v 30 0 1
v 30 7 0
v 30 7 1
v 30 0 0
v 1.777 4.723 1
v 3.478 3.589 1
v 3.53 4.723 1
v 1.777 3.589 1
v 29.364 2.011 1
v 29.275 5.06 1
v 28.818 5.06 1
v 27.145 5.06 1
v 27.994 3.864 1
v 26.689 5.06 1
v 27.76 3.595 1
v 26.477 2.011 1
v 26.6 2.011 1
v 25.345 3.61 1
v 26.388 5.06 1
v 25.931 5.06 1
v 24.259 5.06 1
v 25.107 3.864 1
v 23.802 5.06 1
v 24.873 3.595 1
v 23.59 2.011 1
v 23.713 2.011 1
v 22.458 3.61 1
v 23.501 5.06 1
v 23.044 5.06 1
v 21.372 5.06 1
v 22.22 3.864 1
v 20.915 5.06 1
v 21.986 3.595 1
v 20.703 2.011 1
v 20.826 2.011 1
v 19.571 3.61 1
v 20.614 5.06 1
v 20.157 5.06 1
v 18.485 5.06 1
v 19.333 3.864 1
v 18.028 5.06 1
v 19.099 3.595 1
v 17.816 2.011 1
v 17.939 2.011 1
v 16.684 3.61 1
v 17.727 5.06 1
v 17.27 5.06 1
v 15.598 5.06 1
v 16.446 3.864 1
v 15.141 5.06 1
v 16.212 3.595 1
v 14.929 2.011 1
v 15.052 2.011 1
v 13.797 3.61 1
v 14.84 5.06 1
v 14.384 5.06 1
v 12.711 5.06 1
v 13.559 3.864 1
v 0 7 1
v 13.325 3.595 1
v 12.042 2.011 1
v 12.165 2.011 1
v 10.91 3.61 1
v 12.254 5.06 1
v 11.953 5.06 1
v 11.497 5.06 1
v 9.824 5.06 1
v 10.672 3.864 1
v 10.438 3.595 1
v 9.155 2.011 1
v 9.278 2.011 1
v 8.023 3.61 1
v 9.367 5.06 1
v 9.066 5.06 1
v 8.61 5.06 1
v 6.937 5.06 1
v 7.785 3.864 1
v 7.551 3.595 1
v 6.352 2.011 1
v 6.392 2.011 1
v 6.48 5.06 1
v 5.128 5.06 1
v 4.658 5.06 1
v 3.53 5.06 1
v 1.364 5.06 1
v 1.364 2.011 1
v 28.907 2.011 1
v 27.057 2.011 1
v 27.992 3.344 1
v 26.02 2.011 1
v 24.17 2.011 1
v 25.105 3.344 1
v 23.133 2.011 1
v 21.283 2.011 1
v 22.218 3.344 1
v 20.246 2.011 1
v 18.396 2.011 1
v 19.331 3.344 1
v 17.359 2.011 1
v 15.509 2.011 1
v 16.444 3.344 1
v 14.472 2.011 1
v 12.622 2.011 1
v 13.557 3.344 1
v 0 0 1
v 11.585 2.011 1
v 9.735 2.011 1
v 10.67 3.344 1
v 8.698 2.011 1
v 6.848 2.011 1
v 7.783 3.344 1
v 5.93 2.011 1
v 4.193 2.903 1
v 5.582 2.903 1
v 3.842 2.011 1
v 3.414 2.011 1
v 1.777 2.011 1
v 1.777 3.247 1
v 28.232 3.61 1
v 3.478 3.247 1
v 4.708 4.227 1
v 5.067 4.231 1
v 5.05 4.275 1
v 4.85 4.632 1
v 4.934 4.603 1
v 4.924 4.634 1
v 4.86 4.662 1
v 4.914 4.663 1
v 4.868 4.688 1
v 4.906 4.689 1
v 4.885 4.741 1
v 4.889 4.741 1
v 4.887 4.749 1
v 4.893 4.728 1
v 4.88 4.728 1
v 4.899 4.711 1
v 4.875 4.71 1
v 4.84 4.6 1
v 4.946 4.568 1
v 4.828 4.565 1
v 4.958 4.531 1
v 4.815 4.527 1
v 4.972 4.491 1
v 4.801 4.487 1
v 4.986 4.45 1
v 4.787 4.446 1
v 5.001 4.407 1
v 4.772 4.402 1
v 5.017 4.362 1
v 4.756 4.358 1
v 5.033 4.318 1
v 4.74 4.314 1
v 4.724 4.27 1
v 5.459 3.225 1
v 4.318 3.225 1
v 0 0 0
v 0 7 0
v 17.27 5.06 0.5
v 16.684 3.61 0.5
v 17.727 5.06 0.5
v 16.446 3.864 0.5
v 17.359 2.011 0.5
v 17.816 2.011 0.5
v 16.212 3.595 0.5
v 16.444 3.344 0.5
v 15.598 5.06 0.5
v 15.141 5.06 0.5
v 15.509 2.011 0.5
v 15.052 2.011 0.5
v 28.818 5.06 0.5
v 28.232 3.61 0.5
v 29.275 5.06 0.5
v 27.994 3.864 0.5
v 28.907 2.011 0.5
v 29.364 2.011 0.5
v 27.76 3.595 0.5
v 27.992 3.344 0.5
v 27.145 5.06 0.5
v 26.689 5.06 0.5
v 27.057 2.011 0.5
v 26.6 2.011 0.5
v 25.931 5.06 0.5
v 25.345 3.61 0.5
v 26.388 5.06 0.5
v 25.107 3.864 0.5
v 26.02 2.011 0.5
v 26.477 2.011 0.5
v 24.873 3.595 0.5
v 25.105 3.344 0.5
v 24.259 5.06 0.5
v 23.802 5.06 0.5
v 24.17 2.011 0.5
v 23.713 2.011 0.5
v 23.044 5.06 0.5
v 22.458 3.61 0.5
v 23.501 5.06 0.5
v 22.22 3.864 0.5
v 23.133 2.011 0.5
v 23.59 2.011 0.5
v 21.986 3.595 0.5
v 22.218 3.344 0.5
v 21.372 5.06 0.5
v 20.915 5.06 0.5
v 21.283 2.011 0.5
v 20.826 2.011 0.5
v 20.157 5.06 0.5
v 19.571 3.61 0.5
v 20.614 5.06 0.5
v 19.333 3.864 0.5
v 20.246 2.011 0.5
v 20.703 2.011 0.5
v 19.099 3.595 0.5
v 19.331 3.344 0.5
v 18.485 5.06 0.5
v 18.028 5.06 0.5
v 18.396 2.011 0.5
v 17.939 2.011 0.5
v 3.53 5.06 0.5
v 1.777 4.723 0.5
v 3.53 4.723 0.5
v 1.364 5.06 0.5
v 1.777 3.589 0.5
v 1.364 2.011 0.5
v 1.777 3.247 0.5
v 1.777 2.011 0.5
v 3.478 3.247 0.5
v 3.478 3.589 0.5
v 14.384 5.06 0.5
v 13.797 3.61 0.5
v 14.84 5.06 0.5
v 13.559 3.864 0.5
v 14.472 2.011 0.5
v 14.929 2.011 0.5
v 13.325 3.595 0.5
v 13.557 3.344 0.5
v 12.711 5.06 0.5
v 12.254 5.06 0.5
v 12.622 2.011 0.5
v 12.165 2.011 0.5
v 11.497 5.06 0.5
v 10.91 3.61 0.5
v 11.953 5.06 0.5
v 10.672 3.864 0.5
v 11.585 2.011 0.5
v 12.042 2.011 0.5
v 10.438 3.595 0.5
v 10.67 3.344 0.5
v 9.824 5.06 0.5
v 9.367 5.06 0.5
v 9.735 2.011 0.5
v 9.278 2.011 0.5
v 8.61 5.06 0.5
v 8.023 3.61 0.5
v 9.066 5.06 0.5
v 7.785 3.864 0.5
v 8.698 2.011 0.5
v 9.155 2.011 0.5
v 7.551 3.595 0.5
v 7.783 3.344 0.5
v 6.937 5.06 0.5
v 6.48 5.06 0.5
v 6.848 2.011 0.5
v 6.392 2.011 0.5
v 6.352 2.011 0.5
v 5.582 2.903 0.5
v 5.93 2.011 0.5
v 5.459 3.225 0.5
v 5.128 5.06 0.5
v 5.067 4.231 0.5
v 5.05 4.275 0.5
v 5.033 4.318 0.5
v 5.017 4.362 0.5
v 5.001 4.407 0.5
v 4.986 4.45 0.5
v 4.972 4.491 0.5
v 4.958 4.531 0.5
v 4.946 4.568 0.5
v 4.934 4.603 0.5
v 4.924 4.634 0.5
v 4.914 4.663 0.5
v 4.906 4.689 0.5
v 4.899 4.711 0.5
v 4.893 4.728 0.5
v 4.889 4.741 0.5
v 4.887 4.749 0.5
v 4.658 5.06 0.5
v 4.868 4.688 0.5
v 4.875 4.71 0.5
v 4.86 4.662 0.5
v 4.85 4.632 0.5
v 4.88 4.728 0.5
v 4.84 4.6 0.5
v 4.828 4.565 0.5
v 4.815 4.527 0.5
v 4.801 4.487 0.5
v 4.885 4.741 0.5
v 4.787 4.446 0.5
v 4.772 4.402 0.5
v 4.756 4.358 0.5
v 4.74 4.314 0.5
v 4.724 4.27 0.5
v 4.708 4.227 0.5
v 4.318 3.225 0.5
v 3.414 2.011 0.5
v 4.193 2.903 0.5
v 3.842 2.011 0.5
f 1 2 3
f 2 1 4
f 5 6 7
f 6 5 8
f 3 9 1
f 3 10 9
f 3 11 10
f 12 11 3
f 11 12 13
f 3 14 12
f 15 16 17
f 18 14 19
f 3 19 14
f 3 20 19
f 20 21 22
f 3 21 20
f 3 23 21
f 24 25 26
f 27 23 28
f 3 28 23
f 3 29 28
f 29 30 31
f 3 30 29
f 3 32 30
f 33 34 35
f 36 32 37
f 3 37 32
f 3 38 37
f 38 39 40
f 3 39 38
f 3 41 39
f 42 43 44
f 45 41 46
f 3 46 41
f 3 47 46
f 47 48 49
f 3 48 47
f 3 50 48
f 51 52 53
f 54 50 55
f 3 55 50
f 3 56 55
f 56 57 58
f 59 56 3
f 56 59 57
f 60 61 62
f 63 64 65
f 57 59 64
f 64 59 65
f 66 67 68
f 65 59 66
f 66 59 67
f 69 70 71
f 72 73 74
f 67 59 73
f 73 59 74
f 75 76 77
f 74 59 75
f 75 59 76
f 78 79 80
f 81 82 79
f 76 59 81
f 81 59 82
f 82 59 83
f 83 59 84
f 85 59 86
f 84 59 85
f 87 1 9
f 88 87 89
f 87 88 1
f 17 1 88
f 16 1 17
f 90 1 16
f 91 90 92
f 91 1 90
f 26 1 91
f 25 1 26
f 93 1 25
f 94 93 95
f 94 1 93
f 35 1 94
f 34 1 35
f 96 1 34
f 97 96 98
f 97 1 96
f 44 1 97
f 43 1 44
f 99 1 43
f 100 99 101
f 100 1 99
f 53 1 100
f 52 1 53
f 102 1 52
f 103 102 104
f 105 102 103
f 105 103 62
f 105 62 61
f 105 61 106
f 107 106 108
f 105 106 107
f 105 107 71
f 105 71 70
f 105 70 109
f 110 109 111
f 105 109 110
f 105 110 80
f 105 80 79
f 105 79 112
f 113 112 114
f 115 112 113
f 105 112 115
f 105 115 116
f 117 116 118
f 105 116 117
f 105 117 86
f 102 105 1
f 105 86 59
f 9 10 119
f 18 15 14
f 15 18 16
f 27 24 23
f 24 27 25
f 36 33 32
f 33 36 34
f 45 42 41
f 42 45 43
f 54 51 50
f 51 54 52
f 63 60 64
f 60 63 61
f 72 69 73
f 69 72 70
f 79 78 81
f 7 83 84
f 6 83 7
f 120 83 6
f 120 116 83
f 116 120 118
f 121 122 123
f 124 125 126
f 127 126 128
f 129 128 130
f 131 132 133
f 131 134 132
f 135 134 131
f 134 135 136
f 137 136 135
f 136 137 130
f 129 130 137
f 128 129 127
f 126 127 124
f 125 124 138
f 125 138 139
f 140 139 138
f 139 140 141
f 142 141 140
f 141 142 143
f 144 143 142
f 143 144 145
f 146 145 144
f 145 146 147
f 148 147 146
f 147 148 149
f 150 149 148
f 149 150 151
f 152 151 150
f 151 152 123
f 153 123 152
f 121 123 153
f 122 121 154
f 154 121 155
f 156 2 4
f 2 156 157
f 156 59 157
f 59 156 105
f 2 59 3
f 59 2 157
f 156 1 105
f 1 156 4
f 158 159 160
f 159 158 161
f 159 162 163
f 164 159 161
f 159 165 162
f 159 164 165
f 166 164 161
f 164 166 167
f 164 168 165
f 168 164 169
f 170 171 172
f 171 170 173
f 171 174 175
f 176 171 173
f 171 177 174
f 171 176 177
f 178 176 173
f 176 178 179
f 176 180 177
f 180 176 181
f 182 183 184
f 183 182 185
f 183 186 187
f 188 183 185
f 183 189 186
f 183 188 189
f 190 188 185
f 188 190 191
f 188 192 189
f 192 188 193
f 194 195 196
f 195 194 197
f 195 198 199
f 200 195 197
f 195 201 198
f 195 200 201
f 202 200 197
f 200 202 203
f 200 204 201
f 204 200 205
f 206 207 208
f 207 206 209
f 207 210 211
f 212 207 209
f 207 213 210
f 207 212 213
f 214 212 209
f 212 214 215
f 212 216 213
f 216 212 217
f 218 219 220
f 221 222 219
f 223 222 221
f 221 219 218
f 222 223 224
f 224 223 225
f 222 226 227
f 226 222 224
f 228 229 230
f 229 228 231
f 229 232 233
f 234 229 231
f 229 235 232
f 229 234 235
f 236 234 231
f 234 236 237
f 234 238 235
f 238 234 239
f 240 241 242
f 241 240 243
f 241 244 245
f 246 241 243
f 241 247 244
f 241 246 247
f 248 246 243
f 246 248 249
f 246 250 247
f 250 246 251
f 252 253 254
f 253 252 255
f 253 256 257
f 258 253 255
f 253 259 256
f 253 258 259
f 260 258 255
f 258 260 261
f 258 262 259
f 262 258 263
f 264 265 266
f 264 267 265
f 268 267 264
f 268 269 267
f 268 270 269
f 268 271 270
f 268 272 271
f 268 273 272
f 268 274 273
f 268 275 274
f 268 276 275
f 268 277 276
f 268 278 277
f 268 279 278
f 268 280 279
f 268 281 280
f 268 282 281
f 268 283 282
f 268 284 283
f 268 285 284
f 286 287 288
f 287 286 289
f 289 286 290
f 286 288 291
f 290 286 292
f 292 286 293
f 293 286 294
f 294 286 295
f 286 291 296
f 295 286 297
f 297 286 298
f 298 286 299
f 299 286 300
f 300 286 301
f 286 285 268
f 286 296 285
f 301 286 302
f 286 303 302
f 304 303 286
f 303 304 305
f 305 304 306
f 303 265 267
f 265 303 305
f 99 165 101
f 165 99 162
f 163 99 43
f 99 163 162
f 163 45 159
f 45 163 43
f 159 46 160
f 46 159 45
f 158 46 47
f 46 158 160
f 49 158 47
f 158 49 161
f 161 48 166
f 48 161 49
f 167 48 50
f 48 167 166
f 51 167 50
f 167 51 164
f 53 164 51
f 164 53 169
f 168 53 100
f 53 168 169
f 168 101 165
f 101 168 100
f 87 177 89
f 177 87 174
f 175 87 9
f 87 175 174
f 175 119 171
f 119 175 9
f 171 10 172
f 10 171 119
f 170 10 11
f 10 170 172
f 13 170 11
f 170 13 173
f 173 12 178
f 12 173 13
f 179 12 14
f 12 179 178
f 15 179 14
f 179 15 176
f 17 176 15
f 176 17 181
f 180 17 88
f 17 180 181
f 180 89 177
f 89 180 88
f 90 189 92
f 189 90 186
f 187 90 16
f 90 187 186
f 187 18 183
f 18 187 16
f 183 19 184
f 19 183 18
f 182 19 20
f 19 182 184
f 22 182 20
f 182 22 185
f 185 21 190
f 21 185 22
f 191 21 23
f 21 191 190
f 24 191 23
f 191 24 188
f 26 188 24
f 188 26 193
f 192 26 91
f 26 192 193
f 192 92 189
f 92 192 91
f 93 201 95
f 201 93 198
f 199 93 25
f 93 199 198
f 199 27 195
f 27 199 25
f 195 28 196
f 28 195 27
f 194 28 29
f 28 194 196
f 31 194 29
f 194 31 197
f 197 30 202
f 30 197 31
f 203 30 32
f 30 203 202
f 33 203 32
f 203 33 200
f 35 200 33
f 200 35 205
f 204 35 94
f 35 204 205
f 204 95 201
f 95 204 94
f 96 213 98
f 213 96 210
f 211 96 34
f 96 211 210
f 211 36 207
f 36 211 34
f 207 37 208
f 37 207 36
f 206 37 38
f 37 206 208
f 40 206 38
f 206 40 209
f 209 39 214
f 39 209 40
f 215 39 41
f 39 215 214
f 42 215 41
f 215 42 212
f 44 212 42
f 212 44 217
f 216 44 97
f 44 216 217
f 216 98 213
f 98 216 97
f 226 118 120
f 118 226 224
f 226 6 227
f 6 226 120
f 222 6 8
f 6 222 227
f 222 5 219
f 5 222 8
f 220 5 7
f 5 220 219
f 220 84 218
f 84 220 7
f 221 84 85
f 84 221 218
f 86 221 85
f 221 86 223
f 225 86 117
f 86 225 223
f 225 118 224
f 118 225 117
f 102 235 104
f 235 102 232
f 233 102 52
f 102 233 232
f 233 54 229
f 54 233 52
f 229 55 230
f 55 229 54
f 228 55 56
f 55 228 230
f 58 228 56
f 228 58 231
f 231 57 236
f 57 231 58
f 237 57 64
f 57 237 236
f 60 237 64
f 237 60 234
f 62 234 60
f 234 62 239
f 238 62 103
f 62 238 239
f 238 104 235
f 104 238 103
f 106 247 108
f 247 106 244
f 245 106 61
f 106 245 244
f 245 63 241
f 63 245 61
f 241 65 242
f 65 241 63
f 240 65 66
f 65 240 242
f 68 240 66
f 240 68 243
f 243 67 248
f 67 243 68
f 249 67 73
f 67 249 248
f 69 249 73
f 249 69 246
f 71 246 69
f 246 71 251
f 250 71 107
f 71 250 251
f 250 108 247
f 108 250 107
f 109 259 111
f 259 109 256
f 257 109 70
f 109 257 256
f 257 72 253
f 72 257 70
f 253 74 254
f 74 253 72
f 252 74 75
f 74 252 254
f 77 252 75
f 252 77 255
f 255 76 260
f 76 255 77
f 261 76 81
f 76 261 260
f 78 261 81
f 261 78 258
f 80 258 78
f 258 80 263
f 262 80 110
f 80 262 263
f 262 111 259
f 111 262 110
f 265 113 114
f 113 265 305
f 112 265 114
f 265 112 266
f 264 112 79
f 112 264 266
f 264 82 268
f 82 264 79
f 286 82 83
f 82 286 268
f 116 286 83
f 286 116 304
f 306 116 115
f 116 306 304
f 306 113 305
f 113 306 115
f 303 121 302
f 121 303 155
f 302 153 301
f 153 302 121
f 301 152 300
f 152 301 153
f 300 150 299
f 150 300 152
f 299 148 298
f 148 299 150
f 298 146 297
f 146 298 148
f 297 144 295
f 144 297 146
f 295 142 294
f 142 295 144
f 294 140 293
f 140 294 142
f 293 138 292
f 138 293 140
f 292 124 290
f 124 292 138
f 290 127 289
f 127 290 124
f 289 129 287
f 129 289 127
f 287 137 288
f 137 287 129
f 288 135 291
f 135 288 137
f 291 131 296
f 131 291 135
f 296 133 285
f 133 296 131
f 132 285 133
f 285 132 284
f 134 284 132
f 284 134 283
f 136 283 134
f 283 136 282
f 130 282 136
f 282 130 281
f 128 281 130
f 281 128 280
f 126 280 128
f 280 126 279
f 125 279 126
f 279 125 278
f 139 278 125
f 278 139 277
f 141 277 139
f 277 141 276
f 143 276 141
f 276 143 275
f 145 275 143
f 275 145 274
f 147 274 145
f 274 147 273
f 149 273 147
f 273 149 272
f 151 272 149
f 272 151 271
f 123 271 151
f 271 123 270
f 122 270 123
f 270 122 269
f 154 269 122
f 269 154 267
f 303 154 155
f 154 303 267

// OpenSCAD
length = 30;
width = 7;
id_text = "FAXXXXXXXX";

difference() {
    cube([length, width, 1]);
    translate([1, width / 2, 0.5])
    linear_extrude(1, convexity = 4)
    resize([length - 2, 0], auto = [true,true,false])
    text(id_text, valign = "center");
}
